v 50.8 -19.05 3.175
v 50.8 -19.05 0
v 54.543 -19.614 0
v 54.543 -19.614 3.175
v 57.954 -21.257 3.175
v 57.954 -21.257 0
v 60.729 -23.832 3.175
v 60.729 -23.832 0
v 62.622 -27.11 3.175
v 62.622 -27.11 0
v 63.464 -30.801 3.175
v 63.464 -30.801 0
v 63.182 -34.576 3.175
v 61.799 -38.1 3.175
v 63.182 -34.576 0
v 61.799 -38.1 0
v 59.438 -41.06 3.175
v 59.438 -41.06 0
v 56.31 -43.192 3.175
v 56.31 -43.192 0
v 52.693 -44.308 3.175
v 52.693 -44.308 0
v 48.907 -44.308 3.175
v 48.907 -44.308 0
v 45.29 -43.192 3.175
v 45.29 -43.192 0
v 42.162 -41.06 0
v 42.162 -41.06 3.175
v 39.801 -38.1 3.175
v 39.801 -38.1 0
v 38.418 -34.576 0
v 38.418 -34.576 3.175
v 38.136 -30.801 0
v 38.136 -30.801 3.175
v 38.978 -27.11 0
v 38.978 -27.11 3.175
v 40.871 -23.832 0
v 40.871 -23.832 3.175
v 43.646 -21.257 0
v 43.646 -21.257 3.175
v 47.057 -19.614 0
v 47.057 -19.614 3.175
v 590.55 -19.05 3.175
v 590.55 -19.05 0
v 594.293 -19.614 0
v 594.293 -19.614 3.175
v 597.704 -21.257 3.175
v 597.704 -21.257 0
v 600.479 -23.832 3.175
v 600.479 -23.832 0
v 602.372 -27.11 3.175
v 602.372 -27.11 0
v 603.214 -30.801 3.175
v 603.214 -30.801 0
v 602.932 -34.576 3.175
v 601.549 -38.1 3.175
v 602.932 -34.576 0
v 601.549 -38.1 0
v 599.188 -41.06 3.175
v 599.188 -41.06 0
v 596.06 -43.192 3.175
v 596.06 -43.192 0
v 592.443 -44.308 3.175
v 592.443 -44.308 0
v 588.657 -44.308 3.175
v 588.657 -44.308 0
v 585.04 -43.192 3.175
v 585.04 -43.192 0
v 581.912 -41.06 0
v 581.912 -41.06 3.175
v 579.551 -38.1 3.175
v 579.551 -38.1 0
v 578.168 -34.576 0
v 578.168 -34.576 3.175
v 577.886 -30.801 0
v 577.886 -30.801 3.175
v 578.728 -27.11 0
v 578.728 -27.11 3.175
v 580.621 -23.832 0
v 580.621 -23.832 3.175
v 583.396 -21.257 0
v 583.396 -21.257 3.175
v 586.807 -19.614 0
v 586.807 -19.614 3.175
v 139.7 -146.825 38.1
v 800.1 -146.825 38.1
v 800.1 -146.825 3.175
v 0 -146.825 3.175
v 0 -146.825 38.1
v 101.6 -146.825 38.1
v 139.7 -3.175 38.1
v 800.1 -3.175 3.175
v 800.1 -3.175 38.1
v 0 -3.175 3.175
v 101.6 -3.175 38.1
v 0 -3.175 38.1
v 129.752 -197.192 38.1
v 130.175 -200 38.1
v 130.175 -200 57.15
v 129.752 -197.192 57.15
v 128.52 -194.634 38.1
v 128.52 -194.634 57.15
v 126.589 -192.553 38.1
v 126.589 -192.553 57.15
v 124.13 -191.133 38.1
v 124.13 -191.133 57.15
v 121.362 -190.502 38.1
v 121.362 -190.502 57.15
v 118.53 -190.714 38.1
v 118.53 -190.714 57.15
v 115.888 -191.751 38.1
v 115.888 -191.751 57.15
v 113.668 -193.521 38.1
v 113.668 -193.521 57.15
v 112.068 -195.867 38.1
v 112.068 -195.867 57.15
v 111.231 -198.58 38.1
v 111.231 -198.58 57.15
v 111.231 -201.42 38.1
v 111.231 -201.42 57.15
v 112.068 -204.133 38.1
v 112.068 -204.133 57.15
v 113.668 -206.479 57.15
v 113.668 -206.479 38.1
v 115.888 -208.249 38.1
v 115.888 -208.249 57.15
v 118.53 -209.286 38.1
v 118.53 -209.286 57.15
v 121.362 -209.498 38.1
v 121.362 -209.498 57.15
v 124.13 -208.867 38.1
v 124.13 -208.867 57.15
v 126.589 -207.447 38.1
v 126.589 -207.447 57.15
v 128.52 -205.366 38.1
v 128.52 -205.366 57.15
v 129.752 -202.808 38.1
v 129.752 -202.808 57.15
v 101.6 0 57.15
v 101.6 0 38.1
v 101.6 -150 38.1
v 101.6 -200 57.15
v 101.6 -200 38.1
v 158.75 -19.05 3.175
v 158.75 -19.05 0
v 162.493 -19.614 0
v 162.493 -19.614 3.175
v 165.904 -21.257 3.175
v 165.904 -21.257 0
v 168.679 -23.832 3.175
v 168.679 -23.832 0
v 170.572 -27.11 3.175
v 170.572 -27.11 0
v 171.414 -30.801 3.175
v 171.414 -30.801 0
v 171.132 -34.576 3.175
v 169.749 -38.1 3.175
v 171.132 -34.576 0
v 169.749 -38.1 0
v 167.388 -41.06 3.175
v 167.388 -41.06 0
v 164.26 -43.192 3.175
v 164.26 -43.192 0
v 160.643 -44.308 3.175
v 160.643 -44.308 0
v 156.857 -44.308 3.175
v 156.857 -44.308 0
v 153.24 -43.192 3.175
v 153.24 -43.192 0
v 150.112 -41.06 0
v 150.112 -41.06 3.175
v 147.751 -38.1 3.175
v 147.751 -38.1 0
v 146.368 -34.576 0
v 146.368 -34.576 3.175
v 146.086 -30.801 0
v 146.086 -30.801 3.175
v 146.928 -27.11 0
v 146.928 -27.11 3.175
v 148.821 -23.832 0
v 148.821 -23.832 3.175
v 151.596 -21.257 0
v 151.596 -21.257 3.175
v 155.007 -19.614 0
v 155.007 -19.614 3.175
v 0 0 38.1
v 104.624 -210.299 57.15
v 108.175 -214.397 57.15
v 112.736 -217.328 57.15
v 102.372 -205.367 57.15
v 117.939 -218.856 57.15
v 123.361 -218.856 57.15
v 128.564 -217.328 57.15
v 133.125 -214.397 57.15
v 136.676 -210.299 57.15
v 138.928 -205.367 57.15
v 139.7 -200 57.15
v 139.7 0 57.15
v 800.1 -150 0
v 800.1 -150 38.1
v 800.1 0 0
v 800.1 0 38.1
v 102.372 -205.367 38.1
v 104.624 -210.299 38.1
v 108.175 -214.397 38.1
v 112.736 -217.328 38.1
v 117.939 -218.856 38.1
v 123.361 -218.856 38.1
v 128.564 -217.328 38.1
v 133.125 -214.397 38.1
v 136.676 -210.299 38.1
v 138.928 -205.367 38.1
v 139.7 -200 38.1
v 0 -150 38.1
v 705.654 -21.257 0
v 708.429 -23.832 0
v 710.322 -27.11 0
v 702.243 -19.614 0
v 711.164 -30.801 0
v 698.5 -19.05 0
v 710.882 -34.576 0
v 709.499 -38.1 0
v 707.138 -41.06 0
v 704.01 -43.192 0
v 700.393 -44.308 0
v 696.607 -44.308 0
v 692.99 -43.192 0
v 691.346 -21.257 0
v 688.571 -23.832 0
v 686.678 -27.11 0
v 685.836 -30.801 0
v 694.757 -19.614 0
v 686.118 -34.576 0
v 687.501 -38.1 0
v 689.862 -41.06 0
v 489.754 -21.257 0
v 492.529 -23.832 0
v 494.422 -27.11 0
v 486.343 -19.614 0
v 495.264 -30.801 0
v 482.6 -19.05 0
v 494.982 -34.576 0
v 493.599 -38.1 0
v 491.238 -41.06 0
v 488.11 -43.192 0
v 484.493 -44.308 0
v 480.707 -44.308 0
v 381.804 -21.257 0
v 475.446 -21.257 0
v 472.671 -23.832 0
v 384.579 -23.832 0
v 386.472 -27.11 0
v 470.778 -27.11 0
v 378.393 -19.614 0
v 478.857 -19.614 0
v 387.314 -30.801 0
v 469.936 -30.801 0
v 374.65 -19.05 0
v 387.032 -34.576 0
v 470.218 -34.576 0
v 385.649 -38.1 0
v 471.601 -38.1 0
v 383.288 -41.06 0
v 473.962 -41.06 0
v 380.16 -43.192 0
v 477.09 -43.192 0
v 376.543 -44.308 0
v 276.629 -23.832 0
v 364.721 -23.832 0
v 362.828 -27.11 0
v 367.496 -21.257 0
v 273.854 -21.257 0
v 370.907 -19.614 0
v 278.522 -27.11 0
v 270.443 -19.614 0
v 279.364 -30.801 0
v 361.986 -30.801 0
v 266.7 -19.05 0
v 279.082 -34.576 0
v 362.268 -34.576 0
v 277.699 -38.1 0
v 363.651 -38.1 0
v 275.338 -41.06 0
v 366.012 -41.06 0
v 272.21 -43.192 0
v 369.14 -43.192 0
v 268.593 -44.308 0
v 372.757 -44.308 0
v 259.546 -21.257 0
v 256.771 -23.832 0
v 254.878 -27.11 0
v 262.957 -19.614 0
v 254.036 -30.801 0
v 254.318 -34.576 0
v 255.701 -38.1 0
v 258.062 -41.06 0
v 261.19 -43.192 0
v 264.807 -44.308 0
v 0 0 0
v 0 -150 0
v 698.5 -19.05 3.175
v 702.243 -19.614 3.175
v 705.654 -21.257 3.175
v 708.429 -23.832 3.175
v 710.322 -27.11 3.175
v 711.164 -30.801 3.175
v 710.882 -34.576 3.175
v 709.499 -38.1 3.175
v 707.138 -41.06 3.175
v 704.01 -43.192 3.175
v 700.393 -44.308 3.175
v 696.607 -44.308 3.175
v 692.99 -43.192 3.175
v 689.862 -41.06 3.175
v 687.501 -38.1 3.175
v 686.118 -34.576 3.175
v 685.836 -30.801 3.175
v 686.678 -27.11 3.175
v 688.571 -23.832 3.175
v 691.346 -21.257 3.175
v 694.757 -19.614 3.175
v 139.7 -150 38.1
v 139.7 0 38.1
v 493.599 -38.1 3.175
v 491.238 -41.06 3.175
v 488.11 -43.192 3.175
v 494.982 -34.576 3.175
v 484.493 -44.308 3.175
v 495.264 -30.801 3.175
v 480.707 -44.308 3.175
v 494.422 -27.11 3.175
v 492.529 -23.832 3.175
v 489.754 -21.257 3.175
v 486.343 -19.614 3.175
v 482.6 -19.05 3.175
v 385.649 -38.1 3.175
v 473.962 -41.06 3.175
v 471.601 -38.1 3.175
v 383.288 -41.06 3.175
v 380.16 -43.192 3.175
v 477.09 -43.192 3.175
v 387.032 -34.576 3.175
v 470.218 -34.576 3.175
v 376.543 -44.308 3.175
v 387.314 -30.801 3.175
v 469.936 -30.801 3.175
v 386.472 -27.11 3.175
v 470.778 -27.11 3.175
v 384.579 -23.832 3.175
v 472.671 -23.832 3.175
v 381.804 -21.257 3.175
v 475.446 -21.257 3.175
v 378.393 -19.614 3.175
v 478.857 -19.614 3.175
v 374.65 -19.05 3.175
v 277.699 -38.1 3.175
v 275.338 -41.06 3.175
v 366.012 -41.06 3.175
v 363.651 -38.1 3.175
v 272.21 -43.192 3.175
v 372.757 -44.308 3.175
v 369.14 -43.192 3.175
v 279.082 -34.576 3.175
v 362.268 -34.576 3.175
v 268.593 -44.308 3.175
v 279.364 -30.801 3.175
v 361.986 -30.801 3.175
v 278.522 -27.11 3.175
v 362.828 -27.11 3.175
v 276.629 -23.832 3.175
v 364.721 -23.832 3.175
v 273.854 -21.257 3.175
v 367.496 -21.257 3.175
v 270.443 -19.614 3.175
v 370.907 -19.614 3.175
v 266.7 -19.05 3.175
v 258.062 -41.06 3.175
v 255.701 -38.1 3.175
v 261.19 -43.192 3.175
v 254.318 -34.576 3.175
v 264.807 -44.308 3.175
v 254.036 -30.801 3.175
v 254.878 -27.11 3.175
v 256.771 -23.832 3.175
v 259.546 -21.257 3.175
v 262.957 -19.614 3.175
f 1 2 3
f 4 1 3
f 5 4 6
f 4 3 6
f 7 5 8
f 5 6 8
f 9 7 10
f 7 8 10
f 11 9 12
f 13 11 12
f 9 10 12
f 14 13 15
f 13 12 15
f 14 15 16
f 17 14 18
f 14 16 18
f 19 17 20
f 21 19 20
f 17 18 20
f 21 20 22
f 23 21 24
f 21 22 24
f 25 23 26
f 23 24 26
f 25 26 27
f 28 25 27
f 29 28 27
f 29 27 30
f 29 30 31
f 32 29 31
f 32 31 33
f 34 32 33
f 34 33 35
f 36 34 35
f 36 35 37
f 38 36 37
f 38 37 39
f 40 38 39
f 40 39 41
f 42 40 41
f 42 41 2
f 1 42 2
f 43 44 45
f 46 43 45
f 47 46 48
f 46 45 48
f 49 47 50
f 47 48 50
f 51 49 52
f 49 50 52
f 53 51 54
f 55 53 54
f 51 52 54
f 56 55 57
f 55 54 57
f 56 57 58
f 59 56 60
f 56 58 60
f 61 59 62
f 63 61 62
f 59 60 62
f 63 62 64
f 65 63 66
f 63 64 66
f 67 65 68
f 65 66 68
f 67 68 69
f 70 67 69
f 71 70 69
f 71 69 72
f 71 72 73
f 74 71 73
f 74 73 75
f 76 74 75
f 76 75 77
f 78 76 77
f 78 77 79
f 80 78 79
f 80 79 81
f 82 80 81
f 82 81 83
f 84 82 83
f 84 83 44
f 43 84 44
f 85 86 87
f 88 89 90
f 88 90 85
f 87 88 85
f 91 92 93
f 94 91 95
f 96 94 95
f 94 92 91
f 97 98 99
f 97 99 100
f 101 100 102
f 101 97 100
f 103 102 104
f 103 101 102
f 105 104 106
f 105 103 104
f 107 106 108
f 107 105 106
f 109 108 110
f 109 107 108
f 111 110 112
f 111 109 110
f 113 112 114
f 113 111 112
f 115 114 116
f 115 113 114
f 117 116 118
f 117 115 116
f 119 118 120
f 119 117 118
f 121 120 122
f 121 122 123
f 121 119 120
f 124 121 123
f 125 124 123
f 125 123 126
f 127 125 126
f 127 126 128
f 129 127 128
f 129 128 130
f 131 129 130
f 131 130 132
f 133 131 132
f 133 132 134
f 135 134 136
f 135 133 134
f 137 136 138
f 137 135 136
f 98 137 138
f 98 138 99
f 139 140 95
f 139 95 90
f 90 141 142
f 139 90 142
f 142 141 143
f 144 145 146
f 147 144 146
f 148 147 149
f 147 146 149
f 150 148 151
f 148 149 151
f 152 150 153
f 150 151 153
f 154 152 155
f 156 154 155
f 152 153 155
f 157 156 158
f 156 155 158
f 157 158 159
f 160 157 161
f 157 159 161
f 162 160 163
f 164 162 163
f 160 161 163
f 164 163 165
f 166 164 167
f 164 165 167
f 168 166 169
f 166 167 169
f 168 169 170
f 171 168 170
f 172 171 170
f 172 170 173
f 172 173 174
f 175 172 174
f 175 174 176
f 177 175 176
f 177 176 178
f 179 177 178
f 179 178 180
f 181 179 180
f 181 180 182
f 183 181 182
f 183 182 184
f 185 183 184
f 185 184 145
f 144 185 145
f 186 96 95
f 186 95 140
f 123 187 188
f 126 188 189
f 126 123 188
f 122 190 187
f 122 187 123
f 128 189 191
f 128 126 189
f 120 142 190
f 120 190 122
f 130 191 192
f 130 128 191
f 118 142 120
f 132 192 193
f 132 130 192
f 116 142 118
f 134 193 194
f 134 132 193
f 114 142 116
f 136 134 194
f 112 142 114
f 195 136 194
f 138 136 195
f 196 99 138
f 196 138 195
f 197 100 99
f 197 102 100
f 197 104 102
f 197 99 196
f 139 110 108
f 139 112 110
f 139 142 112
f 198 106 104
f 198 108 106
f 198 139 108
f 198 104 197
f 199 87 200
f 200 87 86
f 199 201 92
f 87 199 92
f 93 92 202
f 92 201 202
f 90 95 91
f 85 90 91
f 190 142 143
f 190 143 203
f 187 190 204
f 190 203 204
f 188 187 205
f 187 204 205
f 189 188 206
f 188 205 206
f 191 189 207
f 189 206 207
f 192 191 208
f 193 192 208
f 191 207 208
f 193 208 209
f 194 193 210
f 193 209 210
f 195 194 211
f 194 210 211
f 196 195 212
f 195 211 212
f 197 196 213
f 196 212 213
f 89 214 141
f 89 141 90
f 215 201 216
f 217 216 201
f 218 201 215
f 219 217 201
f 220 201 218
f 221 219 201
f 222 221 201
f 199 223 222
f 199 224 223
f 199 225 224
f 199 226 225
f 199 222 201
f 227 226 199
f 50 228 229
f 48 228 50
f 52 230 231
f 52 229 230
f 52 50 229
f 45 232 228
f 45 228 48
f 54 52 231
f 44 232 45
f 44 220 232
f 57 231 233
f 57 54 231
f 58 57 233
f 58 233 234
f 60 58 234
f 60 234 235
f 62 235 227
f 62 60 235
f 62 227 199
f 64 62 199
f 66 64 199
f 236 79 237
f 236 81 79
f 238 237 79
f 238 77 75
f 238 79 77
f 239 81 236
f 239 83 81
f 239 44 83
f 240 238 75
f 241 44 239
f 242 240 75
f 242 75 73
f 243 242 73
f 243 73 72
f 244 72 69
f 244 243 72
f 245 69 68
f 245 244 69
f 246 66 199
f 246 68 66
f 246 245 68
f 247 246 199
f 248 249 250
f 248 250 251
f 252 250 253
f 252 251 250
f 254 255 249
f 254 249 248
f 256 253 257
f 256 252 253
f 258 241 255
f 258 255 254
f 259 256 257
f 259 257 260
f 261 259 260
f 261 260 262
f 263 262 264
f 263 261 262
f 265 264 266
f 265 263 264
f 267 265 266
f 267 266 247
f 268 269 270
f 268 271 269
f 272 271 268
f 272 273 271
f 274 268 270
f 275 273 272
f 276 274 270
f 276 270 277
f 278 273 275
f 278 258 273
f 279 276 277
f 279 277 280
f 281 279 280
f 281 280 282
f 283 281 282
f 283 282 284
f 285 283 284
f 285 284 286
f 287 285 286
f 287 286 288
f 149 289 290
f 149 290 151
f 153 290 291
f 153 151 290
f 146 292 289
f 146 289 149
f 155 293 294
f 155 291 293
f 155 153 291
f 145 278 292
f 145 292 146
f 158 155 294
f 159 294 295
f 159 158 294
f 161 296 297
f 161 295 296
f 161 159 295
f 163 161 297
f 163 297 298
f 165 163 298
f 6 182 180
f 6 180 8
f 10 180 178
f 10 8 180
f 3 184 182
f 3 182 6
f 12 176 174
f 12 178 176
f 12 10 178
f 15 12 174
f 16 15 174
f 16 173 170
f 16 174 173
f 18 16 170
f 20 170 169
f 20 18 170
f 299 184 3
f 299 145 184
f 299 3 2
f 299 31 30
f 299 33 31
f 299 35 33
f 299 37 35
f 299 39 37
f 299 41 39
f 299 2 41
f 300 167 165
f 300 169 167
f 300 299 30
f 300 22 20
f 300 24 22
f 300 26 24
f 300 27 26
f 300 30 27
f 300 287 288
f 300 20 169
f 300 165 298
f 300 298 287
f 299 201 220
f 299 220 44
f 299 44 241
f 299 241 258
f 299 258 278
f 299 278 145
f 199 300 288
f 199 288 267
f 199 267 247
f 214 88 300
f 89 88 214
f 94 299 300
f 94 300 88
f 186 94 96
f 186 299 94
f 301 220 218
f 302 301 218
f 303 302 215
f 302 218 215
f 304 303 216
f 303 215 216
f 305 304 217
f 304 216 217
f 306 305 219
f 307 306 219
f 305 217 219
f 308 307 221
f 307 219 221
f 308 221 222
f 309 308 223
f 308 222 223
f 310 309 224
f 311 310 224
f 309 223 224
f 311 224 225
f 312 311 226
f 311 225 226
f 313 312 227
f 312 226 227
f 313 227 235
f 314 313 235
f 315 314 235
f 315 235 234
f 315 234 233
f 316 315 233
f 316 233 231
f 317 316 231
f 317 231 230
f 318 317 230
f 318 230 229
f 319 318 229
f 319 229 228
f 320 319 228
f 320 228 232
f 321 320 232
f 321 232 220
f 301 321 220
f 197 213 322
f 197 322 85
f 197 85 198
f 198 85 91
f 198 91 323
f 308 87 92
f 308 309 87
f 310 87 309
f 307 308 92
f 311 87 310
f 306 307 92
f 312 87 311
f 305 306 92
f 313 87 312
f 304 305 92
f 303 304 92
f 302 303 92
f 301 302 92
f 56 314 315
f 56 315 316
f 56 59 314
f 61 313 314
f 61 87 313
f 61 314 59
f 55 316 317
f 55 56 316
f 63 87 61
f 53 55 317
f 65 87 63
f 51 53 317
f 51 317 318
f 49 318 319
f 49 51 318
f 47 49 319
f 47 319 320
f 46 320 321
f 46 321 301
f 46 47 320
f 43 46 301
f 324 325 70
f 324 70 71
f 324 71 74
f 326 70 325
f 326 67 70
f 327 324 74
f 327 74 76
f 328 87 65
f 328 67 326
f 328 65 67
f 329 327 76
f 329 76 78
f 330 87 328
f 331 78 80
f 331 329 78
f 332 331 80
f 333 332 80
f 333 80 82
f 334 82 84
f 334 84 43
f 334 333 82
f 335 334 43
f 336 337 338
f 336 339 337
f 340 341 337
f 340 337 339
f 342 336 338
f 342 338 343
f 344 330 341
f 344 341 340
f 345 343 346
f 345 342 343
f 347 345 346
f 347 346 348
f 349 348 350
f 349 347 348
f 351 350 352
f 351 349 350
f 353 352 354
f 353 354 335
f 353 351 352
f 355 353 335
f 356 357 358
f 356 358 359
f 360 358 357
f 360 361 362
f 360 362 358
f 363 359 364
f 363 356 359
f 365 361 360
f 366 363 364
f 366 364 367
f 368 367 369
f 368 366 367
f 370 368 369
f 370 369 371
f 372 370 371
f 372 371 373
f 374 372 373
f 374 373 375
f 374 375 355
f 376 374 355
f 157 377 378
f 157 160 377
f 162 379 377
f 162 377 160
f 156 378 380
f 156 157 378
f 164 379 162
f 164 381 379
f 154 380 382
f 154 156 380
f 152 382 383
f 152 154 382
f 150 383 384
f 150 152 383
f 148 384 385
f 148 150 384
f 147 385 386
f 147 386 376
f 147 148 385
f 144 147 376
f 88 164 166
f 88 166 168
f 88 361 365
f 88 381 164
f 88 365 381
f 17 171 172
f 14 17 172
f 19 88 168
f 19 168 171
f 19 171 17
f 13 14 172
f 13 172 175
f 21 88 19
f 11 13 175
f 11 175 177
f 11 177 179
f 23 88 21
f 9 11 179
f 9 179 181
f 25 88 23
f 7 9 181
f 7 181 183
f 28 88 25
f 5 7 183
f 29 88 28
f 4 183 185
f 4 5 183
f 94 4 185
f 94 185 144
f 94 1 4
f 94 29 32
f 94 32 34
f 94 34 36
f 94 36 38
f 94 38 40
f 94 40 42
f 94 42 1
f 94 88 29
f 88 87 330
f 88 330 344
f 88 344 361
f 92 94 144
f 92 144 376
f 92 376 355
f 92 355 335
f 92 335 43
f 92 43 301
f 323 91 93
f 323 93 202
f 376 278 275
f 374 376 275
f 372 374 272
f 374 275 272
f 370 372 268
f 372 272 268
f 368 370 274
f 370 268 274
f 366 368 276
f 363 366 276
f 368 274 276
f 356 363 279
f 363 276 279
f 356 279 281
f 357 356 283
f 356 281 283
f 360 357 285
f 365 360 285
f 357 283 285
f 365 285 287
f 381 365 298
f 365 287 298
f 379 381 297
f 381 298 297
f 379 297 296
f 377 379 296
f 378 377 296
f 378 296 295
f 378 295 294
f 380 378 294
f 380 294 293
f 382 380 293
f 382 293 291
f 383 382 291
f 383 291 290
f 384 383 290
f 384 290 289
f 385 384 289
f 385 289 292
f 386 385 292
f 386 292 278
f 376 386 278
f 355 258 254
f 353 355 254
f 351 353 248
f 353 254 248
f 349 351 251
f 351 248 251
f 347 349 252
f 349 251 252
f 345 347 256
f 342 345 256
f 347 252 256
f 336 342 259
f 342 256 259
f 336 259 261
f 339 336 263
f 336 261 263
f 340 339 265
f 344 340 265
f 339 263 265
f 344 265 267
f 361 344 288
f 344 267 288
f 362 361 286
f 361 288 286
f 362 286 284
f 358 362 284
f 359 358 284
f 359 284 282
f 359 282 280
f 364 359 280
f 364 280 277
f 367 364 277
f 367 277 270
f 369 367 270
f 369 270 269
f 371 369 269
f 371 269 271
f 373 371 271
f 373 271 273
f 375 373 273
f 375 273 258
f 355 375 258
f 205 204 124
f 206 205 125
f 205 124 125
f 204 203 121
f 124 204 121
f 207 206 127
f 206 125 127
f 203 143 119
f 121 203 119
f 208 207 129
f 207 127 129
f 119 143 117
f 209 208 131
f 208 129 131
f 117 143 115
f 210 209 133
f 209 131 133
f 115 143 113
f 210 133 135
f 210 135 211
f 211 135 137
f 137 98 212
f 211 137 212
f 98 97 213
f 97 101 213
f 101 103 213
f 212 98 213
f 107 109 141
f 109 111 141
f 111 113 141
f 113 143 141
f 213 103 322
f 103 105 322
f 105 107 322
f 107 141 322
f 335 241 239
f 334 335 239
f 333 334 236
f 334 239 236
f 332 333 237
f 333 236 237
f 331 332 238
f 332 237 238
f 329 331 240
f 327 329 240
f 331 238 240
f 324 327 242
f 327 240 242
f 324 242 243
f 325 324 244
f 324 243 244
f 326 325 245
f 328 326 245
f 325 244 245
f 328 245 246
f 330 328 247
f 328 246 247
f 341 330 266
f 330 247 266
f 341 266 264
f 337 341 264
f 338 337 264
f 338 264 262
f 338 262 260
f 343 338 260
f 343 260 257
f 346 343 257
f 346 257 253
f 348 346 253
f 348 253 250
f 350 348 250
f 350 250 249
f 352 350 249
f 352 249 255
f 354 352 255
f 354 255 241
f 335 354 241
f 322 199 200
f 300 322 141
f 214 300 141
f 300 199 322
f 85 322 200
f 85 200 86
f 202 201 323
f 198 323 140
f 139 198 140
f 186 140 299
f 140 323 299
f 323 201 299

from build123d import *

# Parameters (mm, degrees)
BASE_EXTRUDE_THIN_DEPTH = 800.1
SKETCH2_R               = 12.7
CUT_EXTRUDE1_DEPTH      = 815.930438749
LPATTERN1_COUNT         = 7
LPATTERN1_PITCH         = 107.95
BOSS_EXTRUDE1_START     = 38.1
BOSS_EXTRUDE1_OUTLINE_R = 9.525
BOSS_EXTRUDE1_DEPTH     = 19.05


# Read off the part's stored shape, not the designer's step: Boss-Extrude1
with BuildPart() as part:
    # Sketch1 → Base-Extrude-Thin (new body)
    with BuildSketch(Plane(origin=(0, 0, 0), x_dir=(0, 0, -1), z_dir=(1, 0, 0))):
        Polygon((-38.1, 0), (0, 0), (0, -150), (-38.1, -150), (-38.1, -146.825), (-3.175, -146.825), (-3.175, -3.175), (-38.1, -3.175), align=None)
    extrude(amount=BASE_EXTRUDE_THIN_DEPTH)

    # Sketch2 → Cut-Extrude1 (cut, through all)
    with BuildSketch(Plane(origin=(0, 0, 0), x_dir=(-1, 0, 0), z_dir=(0, 0, -1))):
        with Locations(Location((-50.8, -31.75, 0), (0, 0, 90))):
            Circle(SKETCH2_R)
    cut_extrude1 = extrude(amount=-CUT_EXTRUDE1_DEPTH, mode=Mode.SUBTRACT)

    # LPattern1: Cut-Extrude1 ×7
    with Locations(*[(i * LPATTERN1_PITCH, 0, 0) for i in range(1, LPATTERN1_COUNT)]):
        add(cut_extrude1, mode=Mode.SUBTRACT)

    # Boss-Extrude1 outline → Boss-Extrude1 (add)
    with BuildSketch(Plane.XY.offset(BOSS_EXTRUDE1_START)):
        with BuildLine():
            Line((101.6, 0), (101.6, -200))
            ThreePointArc((101.6, -200), (120.65, -219.05), (139.7, -200))
            Line((139.7, -200), (139.7, 0))
            Line((139.7, 0), (101.6, 0))
        make_face()
        with Locations((120.65, -200)):
            Circle(BOSS_EXTRUDE1_OUTLINE_R, mode=Mode.SUBTRACT)
    extrude(amount=BOSS_EXTRUDE1_DEPTH)


solid = part.part
